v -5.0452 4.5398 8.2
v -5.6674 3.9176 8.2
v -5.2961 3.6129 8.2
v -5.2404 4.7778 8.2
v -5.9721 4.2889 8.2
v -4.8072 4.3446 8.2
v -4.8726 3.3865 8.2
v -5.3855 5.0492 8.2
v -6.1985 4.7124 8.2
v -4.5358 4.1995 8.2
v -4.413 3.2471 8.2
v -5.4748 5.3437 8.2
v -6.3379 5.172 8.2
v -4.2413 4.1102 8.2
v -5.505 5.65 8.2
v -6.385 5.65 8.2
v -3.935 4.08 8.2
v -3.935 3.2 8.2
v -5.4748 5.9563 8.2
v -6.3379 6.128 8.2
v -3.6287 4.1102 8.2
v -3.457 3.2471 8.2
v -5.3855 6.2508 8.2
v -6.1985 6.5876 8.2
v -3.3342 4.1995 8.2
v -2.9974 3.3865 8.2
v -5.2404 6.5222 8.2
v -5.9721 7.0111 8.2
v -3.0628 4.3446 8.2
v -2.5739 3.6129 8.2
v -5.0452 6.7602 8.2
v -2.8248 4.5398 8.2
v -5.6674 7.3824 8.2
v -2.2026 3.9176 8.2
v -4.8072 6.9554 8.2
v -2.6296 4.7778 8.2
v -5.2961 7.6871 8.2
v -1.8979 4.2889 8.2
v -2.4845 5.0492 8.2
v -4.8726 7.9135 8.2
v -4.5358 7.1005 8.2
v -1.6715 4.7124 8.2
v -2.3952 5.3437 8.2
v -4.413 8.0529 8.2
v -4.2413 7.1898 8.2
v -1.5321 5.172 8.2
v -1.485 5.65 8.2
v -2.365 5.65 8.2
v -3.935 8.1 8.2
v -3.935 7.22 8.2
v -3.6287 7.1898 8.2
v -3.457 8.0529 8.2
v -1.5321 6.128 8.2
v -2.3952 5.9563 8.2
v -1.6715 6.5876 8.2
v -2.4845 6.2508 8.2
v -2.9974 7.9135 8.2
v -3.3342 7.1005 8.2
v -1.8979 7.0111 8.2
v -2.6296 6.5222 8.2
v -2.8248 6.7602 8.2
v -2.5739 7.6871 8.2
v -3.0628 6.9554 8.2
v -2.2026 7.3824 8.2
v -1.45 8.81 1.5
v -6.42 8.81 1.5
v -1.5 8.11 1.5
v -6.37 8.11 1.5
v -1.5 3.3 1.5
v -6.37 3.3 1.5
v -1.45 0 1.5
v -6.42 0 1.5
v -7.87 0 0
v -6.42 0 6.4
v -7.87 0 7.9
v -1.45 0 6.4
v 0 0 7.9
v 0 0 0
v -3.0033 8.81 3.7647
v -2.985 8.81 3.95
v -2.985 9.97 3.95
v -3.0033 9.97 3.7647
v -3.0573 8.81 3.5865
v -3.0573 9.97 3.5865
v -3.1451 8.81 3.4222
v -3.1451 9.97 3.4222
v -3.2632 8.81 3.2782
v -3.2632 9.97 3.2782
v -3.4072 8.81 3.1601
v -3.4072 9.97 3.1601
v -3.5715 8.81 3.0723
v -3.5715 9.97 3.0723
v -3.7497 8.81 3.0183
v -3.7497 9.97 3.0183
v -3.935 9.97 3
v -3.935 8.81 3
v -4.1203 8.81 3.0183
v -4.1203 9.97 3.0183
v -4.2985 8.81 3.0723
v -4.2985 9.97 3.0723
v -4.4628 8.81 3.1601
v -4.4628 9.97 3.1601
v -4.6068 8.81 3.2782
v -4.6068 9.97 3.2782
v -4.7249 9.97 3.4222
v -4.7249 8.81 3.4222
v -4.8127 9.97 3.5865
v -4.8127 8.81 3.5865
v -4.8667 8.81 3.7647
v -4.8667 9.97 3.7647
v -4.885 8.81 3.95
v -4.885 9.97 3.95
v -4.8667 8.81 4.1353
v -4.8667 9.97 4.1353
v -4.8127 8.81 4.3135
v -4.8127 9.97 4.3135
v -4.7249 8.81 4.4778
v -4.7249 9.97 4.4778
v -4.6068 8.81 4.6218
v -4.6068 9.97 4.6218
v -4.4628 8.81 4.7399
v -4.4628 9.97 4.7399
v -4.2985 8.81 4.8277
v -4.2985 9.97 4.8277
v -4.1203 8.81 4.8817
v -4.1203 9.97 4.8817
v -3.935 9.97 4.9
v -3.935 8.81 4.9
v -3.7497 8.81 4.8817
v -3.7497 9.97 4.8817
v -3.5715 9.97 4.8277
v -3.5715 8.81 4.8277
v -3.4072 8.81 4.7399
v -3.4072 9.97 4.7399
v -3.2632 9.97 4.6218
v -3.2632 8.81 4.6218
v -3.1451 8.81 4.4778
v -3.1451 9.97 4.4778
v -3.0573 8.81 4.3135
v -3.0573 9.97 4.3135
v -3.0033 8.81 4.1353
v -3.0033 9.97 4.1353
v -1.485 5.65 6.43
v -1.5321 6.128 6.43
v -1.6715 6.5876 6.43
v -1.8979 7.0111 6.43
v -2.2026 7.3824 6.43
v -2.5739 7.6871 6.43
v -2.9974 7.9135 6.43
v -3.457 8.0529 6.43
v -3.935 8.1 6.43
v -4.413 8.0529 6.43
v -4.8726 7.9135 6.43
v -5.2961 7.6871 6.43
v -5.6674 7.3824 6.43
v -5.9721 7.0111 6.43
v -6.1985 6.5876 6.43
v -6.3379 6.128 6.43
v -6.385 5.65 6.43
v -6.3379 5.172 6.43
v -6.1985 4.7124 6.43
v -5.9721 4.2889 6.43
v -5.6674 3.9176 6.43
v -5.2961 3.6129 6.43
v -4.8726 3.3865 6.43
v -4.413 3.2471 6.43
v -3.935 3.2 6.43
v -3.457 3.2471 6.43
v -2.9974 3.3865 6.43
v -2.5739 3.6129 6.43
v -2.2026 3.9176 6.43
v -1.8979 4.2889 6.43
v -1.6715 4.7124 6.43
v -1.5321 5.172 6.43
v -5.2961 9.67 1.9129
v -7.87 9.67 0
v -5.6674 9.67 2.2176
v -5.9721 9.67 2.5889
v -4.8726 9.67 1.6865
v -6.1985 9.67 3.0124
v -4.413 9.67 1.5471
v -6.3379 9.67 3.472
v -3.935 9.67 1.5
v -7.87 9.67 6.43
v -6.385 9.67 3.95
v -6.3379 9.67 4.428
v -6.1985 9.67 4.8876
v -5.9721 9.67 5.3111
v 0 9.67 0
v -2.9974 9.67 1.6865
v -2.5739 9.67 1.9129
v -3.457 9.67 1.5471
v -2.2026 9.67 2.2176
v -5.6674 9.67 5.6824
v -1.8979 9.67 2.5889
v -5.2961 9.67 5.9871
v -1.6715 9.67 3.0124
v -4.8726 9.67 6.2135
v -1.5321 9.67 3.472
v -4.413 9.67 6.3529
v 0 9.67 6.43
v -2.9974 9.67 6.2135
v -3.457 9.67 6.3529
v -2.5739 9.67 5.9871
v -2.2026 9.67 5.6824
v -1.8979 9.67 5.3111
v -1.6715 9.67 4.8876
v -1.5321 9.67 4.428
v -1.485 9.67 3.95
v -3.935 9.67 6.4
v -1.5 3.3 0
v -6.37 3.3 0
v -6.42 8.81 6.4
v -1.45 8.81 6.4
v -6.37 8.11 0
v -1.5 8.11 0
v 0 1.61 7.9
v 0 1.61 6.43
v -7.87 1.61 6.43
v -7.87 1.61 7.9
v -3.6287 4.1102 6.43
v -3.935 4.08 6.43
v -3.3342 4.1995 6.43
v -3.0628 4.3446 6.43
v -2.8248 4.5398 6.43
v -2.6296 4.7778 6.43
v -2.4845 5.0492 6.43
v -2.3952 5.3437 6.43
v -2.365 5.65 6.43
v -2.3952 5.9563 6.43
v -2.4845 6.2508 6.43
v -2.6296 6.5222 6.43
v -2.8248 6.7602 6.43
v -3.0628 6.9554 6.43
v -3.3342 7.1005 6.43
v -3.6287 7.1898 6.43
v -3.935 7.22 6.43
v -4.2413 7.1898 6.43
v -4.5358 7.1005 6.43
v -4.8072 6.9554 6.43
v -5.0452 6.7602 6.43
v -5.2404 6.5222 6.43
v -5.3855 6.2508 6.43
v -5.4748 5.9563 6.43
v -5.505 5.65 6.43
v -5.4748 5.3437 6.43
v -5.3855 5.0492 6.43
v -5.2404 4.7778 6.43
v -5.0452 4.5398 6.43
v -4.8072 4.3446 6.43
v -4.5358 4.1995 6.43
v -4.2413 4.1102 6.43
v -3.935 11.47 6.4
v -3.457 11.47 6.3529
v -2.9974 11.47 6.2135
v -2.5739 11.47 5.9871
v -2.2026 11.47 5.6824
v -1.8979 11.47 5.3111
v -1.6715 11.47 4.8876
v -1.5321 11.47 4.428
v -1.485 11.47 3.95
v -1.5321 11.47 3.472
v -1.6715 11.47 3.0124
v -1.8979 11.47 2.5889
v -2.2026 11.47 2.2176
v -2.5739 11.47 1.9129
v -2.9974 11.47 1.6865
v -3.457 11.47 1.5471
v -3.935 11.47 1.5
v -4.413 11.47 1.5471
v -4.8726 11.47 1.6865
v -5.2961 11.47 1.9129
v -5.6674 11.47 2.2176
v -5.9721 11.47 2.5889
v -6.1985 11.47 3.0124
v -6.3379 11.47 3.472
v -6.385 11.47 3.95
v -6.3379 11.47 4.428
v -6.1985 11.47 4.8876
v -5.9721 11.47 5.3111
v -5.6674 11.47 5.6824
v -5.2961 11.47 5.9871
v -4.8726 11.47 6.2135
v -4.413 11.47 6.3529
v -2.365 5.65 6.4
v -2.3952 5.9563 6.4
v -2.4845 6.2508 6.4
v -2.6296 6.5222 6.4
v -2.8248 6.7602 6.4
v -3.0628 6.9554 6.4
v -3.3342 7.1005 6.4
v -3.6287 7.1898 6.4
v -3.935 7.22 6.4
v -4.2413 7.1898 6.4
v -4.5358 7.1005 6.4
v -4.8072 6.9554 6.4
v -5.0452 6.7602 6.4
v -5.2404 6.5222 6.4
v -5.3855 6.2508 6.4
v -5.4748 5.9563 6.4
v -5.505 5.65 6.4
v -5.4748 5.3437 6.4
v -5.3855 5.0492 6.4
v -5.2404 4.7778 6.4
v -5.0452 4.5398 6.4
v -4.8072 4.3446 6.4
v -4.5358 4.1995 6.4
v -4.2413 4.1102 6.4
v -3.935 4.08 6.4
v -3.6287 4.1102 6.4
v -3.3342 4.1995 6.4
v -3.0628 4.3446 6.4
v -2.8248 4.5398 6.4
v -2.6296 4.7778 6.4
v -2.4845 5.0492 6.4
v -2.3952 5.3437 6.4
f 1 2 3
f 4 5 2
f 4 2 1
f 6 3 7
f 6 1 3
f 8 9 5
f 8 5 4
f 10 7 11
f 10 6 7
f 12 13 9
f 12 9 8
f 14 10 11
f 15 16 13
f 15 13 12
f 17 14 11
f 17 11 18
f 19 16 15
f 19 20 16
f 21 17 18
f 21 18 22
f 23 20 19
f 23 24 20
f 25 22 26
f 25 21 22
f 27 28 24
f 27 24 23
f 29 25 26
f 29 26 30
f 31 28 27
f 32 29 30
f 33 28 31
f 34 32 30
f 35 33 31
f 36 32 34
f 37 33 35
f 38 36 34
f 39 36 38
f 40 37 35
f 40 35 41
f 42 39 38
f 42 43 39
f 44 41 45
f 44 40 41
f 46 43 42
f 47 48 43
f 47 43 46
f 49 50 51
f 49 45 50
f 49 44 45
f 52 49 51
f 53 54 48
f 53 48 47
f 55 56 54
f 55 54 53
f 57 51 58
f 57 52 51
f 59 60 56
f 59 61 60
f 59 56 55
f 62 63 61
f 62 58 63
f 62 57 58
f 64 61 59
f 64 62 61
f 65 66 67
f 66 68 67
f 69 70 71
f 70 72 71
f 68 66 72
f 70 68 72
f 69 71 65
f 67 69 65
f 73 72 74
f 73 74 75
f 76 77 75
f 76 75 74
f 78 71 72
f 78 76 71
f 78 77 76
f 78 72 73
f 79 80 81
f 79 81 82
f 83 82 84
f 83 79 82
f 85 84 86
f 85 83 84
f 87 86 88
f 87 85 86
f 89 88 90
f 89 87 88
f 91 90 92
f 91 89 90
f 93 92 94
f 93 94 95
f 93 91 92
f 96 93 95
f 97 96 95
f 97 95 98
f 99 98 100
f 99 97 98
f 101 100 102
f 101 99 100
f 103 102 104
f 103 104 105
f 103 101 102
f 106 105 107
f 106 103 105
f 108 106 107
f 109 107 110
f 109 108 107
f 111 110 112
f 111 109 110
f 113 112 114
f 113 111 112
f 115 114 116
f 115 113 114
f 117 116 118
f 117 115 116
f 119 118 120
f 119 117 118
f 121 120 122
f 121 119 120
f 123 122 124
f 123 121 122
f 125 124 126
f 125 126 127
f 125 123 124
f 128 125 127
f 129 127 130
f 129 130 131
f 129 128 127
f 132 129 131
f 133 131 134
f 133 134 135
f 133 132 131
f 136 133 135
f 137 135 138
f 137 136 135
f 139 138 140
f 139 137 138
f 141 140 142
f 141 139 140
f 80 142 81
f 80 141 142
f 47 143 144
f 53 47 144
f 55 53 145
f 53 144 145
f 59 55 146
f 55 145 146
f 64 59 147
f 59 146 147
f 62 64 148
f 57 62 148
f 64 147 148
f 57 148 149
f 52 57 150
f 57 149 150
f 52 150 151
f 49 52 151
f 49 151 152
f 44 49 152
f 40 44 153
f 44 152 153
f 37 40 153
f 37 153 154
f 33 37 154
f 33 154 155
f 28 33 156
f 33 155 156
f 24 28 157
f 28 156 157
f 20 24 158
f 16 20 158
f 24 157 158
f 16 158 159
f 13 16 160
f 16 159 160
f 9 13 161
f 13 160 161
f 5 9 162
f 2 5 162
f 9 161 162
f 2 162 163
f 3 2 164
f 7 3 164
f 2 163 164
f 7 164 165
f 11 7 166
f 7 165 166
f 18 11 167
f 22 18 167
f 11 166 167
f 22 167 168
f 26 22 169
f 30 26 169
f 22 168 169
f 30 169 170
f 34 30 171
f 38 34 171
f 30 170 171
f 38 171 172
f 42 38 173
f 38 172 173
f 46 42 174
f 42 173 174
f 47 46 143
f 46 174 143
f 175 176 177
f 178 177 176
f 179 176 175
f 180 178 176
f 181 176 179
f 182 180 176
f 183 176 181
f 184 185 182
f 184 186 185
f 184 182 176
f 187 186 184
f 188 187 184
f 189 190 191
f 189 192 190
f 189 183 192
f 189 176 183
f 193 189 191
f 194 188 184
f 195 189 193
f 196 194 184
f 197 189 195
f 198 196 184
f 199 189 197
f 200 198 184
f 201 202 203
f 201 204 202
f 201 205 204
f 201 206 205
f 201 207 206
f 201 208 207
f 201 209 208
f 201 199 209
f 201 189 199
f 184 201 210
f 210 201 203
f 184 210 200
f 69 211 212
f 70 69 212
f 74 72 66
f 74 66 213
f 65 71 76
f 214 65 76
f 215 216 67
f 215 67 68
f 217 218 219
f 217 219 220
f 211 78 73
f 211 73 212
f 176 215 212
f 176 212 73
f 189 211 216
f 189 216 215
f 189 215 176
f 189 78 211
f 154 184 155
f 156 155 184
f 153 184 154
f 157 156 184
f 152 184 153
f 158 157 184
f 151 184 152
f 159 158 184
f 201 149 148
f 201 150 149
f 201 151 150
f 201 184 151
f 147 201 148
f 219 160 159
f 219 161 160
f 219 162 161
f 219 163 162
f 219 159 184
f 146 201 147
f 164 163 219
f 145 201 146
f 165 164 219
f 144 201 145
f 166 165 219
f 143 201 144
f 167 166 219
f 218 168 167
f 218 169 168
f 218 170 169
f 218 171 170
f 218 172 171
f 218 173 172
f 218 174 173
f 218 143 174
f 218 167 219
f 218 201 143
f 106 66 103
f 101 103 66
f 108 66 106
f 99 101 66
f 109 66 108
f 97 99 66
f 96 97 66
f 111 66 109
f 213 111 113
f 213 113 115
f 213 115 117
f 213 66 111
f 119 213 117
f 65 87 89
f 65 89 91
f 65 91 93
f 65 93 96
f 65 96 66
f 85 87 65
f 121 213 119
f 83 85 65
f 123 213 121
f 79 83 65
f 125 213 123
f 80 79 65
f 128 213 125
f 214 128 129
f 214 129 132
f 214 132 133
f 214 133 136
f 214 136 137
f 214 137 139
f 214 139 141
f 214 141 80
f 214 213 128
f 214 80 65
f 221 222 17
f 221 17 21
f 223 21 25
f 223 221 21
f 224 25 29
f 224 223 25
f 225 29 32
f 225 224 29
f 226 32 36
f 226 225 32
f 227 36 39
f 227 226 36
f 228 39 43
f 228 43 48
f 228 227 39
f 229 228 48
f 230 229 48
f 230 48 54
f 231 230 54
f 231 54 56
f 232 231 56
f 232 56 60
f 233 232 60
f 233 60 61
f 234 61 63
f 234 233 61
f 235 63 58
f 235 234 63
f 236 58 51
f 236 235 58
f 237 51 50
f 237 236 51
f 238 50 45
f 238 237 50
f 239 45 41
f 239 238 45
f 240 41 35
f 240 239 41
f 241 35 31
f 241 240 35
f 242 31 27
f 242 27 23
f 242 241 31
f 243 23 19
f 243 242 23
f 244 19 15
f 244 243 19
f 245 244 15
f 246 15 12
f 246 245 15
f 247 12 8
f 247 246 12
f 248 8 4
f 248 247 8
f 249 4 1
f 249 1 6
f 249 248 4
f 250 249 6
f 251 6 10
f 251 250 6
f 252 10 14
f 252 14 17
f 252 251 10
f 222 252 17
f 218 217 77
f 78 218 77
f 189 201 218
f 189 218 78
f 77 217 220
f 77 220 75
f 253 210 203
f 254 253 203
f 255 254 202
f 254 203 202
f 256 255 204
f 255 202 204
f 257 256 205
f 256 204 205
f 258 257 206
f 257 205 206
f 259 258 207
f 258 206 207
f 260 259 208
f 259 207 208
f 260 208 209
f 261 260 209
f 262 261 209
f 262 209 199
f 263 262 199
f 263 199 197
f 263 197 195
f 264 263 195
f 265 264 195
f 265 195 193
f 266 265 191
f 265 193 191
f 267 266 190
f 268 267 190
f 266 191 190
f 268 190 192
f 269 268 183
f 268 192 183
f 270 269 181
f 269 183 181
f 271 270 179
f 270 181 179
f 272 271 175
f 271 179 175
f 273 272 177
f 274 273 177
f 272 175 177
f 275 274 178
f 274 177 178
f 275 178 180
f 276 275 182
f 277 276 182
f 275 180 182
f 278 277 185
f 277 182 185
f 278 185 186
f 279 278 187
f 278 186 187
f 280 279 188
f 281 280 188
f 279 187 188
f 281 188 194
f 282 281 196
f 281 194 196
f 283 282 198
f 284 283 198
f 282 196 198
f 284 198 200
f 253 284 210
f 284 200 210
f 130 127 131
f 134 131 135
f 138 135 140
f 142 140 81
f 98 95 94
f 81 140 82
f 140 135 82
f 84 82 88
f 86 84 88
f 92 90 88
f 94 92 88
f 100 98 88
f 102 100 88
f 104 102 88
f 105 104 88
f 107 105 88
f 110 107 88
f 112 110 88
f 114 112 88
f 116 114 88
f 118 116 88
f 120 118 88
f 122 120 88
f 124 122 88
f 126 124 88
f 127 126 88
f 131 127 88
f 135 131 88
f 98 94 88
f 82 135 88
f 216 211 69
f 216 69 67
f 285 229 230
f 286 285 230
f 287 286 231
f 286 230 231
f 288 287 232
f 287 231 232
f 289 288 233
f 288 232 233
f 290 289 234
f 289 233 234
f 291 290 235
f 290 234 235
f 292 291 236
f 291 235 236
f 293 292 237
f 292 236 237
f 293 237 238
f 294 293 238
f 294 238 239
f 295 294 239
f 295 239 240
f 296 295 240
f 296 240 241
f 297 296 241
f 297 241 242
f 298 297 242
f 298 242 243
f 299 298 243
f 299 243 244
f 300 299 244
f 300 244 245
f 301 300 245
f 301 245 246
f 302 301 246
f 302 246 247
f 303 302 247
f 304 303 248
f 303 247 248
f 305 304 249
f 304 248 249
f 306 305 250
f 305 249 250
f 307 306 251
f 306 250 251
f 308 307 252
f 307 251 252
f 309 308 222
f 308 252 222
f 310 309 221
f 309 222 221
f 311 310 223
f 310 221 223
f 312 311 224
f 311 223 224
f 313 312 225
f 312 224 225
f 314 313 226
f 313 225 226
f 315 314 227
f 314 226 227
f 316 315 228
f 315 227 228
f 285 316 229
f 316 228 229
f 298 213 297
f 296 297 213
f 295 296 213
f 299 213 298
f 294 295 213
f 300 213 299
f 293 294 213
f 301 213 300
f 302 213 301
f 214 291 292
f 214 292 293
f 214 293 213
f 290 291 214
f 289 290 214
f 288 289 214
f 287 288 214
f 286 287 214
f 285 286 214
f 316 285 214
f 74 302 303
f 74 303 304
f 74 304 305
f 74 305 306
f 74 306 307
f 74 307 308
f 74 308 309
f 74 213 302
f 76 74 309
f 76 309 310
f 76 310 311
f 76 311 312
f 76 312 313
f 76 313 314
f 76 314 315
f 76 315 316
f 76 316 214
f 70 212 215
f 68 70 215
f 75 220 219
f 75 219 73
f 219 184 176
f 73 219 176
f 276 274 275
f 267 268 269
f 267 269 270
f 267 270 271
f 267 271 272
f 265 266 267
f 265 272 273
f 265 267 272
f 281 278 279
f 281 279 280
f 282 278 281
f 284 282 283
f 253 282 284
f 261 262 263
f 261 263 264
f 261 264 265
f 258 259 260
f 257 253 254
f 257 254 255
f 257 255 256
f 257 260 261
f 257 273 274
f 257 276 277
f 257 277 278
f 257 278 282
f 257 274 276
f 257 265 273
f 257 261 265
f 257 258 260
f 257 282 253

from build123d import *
from build123d.topology import SkipClean

# Parameters (mm, degrees)
BOSS_EXTRUDE1_DEPTH = 7.87
SKETCH2_R           = 2.45
BOSS_EXTRUDE2_DEPTH = 1.8
SKETCH3_R           = 2.45
SKETCH3_R_2         = 1.57
BOSS_EXTRUDE3_DEPTH = 1.77
SKETCH4_R           = 1.57
CUT_EXTRUDE1_DEPTH  = 16.324578298
SKETCH5_W           = 4.87
SKETCH5_H           = 4.81
CUT_EXTRUDE2_DEPTH  = 4.92
SKETCH6_W           = 4.97
SKETCH6_H           = 4.9
CUT_EXTRUDE3_DEPTH  = 8.81
SHELL1_START        = 8.81
SHELL1_OUTLINE_R    = 0.95
SHELL1_DEPTH        = 1.16


# Read off the part's stored shape, not the designer's step: Shell1
with BuildPart() as part:
    # Sketch1 → Boss-Extrude1 (new body)
    with BuildSketch(Plane(origin=(0, 0, 0), x_dir=(0, 0, -1), z_dir=(1, 0, 0))):
        Polygon((0, 0), (0, 9.67), (-6.43, 9.67), (-6.43, 1.61), (-7.9, 1.61), (-7.9, 0), align=None)
    extrude(amount=-BOSS_EXTRUDE1_DEPTH)

    # Sketch2 → Boss-Extrude2 (add)
    with BuildSketch(Plane(origin=(0, 9.67, 0), x_dir=(1, 0, 0), z_dir=(0, 1, 0))):
        with Locations(Location((-3.935, -3.95, 0), (0, 0, 270))):
            Circle(SKETCH2_R)
    extrude(amount=BOSS_EXTRUDE2_DEPTH)

    # Sketch3 → Boss-Extrude3 (add)
    with BuildSketch(Plane.XY.offset(6.43)):
        with Locations((-3.935, 5.65)):
            Circle(SKETCH3_R)
        with Locations(Location((-3.935, 5.65, 0), (0, 0, 270))):
            Circle(SKETCH3_R_2, mode=Mode.SUBTRACT)
    extrude(amount=BOSS_EXTRUDE3_DEPTH)

    # Sketch4 → Cut-Extrude1 (cut, through all)
    with SkipClean():  # the faces are left unmerged after this step: merging them gives an invalid solid
        with BuildSketch(Plane.XY.offset(6.43)):
            with Locations((-3.935, 5.65)):
                Circle(SKETCH4_R)
        extrude(amount=-CUT_EXTRUDE1_DEPTH, mode=Mode.SUBTRACT)

    # Sketch5 → Cut-Extrude2 (cut)
    with SkipClean():  # the faces are left unmerged after this step: merging them gives an invalid solid
        with BuildSketch(Plane(origin=(0, 0, 0), x_dir=(-1, 0, 0), z_dir=(0, 0, -1))):
            with Locations((3.935, 5.705)):
                Rectangle(SKETCH5_W, SKETCH5_H)
        extrude(amount=-CUT_EXTRUDE2_DEPTH, mode=Mode.SUBTRACT)

    # Sketch6 → Cut-Extrude3 (cut)
    with SkipClean():  # the faces are left unmerged after this step: merging them gives an invalid solid
        with BuildSketch(Plane.XZ):
            with Locations((-3.935, 3.95)):
                Rectangle(SKETCH6_W, SKETCH6_H)
        extrude(amount=-CUT_EXTRUDE3_DEPTH, mode=Mode.SUBTRACT)

    # Shell1 outline → Shell1 (cut)
    with SkipClean():  # the faces are left unmerged after this step: merging them gives an invalid solid
        with BuildSketch(Plane(origin=(0, 0, 0), x_dir=(1, 0, 0), z_dir=(0, 1, 0)).offset(SHELL1_START)):
            with Locations((-3.935, -3.95)):
                Circle(SHELL1_OUTLINE_R)
        extrude(amount=SHELL1_DEPTH, mode=Mode.SUBTRACT)


solid = part.part
